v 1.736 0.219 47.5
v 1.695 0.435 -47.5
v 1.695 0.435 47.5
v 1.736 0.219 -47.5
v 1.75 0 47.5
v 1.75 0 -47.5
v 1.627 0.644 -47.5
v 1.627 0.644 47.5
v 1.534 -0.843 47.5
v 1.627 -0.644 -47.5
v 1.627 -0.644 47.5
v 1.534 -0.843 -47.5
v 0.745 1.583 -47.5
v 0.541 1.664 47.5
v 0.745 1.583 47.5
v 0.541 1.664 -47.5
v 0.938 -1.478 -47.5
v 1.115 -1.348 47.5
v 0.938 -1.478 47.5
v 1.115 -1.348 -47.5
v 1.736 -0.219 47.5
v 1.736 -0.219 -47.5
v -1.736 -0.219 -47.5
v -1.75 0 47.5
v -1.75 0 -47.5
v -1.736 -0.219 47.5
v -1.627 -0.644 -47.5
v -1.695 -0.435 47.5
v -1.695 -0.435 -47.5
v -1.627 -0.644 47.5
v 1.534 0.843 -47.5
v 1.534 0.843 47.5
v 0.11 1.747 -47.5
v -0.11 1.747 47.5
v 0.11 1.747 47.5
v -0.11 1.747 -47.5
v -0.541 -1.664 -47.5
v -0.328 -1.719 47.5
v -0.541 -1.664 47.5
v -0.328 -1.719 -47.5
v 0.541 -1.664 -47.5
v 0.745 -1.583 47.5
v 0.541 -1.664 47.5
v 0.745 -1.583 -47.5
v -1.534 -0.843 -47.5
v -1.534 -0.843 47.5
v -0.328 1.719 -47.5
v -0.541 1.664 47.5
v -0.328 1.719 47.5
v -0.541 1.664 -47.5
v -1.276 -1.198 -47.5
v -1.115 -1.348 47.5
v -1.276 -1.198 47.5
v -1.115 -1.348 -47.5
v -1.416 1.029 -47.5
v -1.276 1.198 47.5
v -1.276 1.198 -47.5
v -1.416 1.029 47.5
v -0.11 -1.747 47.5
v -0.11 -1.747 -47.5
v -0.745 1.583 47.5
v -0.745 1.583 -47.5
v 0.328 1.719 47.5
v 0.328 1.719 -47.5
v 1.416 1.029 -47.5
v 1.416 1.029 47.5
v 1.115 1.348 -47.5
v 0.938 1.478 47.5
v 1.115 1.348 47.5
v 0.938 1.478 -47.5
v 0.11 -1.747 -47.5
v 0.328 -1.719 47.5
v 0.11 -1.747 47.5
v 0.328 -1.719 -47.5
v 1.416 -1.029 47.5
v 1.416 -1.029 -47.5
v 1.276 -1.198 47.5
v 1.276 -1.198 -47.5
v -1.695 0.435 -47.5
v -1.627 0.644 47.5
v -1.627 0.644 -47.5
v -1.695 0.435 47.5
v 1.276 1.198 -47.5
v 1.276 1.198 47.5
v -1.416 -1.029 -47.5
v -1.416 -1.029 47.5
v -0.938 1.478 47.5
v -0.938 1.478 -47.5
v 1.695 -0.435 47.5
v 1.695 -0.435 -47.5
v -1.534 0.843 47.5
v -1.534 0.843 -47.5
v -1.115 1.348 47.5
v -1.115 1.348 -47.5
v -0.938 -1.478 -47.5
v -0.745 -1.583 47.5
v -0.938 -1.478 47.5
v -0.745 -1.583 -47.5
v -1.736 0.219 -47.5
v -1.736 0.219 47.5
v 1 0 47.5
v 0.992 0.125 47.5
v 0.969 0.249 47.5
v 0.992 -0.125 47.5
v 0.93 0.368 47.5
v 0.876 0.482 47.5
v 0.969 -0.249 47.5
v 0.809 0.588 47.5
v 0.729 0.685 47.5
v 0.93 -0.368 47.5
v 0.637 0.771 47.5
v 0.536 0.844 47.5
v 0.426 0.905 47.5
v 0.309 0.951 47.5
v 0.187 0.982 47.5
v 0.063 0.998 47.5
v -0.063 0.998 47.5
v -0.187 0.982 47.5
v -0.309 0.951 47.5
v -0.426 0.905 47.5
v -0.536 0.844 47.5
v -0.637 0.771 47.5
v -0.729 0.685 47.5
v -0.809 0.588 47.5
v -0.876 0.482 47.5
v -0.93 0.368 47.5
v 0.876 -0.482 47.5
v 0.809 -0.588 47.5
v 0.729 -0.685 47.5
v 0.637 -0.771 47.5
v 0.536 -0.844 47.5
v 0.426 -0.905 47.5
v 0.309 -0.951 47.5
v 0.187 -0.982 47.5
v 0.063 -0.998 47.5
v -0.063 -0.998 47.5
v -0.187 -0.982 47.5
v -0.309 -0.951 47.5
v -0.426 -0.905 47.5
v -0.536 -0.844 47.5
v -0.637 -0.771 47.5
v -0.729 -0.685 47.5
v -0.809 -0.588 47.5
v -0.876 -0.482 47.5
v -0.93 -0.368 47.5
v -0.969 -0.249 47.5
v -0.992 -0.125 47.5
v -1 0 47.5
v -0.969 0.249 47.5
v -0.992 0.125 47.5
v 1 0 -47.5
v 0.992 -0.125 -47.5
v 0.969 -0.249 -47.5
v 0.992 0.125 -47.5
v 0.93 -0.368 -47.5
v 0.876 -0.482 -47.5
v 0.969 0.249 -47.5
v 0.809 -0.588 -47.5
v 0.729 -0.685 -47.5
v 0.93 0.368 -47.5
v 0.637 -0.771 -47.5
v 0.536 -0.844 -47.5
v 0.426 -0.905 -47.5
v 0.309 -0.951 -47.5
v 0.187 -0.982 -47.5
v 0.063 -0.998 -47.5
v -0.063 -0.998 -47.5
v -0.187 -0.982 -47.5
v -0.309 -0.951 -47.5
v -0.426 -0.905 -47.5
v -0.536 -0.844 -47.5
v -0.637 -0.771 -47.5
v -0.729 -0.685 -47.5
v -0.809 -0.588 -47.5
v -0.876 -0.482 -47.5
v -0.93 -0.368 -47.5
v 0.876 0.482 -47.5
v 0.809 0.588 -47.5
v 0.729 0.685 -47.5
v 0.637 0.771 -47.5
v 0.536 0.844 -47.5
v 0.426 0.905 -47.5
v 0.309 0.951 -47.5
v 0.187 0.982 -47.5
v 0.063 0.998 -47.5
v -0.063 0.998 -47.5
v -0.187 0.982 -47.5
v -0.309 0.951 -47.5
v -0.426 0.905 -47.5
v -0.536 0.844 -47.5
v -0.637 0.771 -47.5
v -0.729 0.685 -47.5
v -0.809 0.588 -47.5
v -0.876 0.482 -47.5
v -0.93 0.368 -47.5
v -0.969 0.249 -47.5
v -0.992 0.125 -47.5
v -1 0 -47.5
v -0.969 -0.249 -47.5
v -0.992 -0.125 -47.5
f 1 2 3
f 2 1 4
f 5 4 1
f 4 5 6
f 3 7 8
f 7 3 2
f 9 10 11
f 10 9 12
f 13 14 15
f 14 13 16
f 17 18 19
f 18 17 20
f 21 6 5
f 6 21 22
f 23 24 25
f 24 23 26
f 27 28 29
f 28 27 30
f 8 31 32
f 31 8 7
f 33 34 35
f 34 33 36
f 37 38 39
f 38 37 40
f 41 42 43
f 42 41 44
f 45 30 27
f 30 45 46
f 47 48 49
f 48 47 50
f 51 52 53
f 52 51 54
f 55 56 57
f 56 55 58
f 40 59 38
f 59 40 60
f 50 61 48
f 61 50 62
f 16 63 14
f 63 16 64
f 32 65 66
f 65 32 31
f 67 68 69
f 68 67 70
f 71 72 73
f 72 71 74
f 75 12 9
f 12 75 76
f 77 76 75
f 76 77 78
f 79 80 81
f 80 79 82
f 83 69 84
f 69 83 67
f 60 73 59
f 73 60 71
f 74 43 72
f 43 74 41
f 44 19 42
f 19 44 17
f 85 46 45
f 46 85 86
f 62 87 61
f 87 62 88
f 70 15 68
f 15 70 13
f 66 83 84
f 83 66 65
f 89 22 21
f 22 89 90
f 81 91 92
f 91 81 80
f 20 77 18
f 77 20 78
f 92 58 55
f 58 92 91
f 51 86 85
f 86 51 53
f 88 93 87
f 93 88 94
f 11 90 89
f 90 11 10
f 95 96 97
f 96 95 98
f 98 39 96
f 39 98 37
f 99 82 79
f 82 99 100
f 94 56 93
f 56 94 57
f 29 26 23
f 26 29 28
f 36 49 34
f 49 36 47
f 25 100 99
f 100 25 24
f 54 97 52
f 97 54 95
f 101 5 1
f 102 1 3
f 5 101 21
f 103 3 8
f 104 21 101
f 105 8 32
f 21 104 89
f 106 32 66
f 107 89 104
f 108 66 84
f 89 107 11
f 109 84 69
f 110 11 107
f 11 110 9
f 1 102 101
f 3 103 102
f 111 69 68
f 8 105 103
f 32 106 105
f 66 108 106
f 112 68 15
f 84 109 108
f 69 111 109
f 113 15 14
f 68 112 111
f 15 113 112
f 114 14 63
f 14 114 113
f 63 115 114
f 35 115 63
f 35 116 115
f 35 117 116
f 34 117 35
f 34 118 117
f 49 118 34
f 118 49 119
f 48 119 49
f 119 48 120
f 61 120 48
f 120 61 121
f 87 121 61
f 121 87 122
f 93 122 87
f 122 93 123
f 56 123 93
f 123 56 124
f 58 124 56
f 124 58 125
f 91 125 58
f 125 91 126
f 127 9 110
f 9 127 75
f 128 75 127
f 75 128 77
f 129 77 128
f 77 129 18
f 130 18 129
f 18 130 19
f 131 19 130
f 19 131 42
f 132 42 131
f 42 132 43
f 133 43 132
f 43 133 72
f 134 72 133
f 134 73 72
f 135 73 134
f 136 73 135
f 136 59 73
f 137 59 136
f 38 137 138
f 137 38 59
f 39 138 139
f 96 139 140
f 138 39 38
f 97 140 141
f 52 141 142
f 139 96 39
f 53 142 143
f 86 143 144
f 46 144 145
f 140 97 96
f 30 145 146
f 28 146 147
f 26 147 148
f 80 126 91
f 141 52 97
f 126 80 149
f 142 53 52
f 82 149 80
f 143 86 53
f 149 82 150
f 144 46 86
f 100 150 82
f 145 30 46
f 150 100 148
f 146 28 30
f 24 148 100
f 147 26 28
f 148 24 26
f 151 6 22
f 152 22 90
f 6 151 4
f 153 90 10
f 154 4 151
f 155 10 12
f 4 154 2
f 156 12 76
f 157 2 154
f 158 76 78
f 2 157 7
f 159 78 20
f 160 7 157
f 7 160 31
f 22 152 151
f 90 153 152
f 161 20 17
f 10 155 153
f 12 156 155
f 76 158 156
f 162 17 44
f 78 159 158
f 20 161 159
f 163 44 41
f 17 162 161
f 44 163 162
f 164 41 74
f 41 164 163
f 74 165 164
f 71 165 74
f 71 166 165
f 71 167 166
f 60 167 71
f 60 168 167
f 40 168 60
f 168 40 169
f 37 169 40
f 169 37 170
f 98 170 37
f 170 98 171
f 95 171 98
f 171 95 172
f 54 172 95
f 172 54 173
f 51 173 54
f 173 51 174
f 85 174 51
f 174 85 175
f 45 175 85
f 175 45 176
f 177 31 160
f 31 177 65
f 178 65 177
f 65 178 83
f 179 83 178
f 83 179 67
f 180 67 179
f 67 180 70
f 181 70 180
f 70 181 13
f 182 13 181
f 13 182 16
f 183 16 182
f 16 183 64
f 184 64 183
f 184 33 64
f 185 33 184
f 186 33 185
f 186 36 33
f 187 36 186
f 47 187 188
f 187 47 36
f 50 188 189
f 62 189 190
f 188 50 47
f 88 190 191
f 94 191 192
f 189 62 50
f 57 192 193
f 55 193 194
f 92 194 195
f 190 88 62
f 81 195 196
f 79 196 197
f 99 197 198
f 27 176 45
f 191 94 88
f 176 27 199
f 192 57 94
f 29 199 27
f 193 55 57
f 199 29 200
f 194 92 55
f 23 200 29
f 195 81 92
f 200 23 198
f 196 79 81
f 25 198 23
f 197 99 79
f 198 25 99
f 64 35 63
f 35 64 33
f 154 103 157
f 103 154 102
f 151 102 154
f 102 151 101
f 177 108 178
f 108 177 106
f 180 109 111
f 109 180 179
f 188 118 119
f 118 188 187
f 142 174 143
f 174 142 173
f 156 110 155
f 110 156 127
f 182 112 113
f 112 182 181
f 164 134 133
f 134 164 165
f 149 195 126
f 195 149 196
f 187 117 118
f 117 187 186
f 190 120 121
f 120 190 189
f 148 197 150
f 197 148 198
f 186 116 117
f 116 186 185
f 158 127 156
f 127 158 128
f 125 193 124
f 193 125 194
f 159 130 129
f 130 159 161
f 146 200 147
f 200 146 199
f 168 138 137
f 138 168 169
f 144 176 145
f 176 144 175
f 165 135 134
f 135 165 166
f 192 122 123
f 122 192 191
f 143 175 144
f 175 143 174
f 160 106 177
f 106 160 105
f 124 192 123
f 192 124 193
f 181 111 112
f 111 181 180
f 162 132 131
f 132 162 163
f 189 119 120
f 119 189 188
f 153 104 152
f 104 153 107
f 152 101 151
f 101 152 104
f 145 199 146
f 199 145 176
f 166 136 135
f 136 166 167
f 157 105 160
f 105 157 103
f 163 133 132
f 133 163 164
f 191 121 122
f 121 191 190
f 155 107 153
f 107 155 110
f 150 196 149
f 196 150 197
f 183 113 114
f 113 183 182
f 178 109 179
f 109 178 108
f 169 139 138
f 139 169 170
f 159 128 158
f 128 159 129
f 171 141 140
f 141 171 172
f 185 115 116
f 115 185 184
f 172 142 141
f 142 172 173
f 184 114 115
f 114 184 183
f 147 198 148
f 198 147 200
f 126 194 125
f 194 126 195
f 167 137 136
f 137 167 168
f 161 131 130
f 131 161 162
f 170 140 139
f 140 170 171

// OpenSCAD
$fn = 50;


difference() {
	union() {
		translate(v = [0, 0, -47.5000000000]) {
			cylinder(h = 95, r = 1.7500000000);
		}
	}
	union() {
		translate(v = [0, 0, -100.0000000000]) {
			cylinder(h = 200, r = 1.0000000000);
		}
	}
}
